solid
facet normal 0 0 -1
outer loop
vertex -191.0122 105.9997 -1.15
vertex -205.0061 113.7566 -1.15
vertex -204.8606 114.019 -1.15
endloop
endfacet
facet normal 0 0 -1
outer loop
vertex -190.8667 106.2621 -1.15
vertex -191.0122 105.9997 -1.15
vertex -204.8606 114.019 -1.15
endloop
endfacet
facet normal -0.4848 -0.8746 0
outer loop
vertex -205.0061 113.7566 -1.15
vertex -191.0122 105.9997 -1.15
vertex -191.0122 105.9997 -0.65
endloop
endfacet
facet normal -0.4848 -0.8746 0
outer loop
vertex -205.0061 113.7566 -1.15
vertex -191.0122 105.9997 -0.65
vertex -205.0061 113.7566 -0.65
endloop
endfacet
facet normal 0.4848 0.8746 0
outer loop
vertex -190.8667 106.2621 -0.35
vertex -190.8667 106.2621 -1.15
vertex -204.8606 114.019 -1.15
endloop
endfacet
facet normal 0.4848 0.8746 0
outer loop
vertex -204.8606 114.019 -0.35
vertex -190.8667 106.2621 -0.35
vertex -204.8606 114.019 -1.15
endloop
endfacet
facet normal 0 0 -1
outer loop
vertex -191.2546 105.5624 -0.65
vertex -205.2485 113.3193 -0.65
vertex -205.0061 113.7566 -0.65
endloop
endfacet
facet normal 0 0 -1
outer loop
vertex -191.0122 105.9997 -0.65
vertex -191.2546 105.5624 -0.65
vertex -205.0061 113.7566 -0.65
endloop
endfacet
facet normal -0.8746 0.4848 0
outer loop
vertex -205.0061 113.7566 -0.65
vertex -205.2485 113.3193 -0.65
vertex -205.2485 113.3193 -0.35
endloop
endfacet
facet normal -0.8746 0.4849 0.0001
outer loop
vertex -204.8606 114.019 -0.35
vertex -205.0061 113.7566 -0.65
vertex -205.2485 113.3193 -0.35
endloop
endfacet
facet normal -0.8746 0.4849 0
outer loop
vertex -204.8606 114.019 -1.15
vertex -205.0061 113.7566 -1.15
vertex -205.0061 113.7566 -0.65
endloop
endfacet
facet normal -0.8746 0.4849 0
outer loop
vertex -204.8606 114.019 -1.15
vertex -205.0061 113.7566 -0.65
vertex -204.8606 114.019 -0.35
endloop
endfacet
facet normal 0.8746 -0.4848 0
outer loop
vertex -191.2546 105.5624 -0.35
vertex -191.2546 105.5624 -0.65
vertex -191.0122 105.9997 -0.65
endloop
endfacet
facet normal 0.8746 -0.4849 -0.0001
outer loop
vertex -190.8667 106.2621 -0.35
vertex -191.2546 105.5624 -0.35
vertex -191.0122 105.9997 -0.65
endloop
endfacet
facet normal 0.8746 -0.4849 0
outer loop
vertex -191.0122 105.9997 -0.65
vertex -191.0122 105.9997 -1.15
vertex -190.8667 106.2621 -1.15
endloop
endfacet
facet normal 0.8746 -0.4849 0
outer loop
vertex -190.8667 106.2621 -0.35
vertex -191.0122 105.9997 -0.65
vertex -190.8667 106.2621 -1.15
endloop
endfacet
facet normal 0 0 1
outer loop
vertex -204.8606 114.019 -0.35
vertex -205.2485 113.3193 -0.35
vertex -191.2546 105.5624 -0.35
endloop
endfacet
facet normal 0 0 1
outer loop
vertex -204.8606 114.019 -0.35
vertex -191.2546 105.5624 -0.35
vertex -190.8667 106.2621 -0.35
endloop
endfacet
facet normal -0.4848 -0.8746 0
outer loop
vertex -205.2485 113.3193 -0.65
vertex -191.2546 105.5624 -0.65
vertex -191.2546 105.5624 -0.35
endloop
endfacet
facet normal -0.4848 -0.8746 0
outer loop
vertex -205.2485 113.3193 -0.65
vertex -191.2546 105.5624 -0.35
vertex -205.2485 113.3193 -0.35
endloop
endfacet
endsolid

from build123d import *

# Parameters (mm, degrees)
BOX121_W               = 0.8
BOX121_H               = 16
BOX121_DEPTH           = 0.8
BOX122_W               = 0.8
BOX122_H               = 16
BOX122_DEPTH           = 0.8
CUT064_PLACEMENT_ANGLE = 61


with BuildPart() as cubo121:
    # Box121 → Box121 (new body)
    with BuildSketch(Plane.XY):
        with Locations((0.4, 8)):
            Rectangle(BOX121_W, BOX121_H)
    extrude(amount=BOX121_DEPTH)


with BuildPart() as perfil_l_2da_cara006:
    # Box122 → Box122 (new body)
    with BuildSketch(Plane(origin=(0.3, 0, 0.3), x_dir=(1, 0, 0), z_dir=(0, 0, 1))):
        with Locations((0.4, 8)):
            Rectangle(BOX122_W, BOX122_H)
    extrude(amount=BOX122_DEPTH)

    # Cut064: cut Cubo121
    add(cubo121.part, mode=Mode.SUBTRACT)


with BuildPart() as perfil_l_2da_cara006_1:
    # Cut064 placement: moved
    add(perfil_l_2da_cara006.part.moved(Location((-191.4, 105.3, -1.45))).rotate(Axis((-191.4, 105.3, -1.45), (0, 0, 1)), CUT064_PLACEMENT_ANGLE))


solid = perfil_l_2da_cara006_1.part
